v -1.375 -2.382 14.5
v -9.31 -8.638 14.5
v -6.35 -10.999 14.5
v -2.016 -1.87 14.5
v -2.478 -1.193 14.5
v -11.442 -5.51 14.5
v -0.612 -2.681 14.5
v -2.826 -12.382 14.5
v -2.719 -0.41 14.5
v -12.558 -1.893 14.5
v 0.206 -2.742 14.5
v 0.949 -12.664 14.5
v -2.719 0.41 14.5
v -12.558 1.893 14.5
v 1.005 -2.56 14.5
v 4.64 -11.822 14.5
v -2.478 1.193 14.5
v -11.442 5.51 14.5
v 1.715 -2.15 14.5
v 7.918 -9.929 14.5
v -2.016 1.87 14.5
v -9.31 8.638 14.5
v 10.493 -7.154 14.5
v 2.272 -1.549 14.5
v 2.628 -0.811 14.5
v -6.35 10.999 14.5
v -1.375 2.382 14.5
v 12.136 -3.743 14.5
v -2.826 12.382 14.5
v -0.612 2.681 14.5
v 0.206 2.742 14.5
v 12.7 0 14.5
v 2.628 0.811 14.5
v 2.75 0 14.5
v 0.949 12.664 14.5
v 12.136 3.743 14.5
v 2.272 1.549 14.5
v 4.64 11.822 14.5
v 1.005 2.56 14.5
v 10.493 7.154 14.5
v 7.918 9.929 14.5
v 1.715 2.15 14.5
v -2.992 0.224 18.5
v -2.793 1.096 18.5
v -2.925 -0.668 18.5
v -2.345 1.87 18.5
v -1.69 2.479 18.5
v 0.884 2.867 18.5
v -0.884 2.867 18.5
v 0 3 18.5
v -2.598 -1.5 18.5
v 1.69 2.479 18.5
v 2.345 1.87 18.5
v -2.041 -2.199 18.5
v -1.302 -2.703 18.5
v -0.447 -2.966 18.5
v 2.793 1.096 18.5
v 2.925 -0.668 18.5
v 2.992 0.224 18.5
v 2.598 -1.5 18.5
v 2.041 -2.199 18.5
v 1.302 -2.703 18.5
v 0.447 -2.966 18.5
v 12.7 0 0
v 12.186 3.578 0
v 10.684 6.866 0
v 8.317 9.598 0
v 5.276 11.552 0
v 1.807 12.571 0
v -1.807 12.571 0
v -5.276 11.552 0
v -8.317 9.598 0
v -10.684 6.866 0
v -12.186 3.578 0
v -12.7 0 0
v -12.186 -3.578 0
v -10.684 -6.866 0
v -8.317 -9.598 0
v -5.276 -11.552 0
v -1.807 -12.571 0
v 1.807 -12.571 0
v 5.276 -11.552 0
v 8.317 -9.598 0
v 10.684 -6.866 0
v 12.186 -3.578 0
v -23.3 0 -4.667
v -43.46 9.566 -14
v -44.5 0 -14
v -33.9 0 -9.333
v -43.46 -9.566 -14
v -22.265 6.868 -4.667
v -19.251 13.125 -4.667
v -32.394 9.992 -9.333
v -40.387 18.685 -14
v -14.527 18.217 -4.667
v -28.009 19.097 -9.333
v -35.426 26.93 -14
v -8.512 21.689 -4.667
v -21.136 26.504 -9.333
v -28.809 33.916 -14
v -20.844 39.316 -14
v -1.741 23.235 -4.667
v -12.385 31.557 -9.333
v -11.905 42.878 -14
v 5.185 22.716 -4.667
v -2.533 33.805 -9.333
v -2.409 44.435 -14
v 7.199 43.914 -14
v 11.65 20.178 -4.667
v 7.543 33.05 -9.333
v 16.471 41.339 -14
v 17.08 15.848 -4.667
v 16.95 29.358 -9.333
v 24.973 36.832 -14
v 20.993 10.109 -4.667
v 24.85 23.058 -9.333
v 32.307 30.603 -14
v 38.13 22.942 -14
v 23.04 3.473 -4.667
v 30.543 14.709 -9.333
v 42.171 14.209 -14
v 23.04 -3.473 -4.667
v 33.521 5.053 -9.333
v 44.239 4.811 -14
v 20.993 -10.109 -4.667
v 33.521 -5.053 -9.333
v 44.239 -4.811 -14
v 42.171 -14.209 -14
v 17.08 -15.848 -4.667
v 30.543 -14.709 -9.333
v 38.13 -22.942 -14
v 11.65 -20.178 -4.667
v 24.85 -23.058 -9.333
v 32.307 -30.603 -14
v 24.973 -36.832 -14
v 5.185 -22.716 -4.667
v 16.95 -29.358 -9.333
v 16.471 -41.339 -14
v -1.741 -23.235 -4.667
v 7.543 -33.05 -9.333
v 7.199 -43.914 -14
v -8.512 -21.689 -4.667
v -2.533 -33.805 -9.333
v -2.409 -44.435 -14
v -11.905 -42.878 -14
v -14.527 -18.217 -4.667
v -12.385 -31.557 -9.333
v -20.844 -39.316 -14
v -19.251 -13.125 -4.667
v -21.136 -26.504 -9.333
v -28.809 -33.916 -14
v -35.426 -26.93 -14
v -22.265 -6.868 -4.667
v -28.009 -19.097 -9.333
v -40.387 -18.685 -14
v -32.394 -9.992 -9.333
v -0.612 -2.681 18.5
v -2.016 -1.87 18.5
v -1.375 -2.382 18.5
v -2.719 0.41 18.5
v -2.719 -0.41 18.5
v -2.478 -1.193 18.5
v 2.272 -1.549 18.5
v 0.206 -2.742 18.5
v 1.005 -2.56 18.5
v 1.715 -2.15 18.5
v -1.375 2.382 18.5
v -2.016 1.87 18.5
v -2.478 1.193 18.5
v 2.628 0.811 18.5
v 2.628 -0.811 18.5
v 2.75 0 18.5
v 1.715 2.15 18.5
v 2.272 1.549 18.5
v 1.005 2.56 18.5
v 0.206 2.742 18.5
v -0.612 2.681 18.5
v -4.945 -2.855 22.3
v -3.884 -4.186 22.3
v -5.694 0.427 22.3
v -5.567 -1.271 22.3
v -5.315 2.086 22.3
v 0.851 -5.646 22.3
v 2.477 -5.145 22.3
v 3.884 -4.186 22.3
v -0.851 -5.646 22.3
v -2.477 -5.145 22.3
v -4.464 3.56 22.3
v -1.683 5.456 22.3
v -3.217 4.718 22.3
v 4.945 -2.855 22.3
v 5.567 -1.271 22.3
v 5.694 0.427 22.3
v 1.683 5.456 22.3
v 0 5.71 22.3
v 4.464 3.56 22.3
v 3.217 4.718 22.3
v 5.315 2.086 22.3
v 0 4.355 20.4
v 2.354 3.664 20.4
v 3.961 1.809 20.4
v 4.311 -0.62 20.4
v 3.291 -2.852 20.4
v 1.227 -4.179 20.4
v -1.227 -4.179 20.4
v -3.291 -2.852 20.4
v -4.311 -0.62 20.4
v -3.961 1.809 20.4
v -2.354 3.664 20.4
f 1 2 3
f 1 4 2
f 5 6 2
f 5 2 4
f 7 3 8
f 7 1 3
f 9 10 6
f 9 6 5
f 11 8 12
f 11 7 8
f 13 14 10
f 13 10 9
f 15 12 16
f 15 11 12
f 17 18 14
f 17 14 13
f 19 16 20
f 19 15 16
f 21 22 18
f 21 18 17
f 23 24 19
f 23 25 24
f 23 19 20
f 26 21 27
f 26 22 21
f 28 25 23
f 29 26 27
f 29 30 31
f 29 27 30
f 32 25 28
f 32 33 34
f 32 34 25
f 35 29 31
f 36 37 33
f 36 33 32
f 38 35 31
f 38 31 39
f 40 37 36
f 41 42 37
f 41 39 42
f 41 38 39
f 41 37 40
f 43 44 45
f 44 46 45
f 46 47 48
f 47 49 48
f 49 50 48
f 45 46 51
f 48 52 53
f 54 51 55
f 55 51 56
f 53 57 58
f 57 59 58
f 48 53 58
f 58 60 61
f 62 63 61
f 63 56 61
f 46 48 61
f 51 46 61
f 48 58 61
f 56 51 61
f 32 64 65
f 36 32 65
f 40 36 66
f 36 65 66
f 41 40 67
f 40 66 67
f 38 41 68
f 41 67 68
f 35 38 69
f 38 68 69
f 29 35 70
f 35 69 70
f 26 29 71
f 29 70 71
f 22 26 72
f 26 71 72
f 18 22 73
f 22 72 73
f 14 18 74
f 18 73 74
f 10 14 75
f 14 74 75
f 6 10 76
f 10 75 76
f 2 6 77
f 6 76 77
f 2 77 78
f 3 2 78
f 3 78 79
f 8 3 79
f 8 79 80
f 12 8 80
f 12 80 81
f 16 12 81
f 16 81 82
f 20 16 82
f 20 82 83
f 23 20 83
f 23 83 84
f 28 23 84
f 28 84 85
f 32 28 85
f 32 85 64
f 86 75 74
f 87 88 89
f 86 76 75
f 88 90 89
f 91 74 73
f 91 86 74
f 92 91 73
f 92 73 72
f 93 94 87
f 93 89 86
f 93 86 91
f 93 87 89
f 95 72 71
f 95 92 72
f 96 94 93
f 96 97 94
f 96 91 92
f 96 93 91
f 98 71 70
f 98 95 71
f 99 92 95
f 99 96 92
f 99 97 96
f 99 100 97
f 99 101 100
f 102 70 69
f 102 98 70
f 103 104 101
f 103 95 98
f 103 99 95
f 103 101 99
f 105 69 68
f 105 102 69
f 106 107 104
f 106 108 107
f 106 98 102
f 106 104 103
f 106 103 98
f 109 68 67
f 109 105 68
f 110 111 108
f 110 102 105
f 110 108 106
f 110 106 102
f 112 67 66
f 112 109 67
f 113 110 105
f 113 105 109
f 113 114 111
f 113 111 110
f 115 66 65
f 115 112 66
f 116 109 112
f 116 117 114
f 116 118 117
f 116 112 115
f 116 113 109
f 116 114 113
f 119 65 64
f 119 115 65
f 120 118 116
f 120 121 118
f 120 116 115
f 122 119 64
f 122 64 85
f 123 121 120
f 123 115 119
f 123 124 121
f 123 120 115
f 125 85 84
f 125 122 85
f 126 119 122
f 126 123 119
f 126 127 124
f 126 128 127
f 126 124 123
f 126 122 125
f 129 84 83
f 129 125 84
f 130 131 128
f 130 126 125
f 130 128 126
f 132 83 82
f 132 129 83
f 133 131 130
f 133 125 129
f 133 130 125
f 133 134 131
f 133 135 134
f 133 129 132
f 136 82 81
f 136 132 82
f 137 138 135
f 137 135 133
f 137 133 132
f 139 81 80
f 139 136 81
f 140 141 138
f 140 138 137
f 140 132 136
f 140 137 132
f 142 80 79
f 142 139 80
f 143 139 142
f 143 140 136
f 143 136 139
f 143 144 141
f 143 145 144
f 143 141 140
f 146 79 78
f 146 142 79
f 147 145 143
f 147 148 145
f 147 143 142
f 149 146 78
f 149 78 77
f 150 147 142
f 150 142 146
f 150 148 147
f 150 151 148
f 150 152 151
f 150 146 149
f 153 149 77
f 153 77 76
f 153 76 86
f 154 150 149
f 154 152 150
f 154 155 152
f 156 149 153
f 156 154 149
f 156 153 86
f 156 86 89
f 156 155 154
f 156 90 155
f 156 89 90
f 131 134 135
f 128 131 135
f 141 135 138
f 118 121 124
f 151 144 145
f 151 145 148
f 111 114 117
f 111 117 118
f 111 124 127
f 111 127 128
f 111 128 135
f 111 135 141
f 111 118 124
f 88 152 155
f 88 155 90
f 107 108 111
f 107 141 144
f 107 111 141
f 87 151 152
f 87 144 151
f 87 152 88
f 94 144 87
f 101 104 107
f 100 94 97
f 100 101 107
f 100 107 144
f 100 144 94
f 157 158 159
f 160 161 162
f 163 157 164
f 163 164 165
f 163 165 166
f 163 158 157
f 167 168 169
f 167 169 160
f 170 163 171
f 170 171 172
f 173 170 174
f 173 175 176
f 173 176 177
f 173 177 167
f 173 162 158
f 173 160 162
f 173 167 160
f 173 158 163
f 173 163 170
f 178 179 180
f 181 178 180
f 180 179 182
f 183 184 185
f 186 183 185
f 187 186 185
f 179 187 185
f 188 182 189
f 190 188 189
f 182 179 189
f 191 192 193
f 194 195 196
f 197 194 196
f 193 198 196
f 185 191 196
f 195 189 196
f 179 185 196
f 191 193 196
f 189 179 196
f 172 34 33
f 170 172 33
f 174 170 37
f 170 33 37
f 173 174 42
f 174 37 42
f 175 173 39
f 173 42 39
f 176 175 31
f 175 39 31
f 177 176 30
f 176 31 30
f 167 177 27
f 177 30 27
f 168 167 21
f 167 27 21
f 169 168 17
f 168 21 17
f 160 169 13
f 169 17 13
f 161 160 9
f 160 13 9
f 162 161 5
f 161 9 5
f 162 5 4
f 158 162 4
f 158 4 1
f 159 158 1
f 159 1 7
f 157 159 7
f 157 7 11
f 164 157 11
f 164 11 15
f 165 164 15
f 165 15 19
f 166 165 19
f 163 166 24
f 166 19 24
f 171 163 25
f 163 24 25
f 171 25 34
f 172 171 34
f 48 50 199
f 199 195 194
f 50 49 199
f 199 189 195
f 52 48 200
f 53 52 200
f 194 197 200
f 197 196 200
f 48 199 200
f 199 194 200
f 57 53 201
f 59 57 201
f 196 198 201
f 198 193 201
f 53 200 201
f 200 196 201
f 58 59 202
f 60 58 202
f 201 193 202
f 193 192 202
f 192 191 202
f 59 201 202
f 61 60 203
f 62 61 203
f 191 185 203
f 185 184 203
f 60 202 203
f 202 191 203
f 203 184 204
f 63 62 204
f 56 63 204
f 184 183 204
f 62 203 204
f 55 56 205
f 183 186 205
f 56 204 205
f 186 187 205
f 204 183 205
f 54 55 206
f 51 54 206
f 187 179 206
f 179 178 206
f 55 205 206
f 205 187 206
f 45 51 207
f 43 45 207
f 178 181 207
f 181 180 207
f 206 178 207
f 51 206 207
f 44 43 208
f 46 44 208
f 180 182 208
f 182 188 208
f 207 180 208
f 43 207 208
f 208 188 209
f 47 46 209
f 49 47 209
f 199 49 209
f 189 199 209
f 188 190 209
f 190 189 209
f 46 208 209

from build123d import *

# Parameters (mm, degrees)
F0_R     = 12.7
F1_DEPTH = 14.5
F4_R     = 2.75
F5_DEPTH = 4


with BuildPart() as f1:
    # F0 (on Top) → F1 (new body)
    with BuildSketch(Plane.XY):
        Circle(F0_R)
    extrude(amount=F1_DEPTH)

    # F2 (on Front) → F3 (revolve)
    with BuildSketch(Plane.XZ):
        Polygon((0, 0), (-12.7, 0), (-44.5, -14), (0, -14), align=None)
    revolve(axis=Axis((0, 0, -7), (0, 0, -1)))

    # F4 (on face) → F5 (join)
    with BuildSketch(Plane.XY.offset(14.5)):
        Circle(F4_R)
    extrude(amount=F5_DEPTH)


with BuildPart() as f7:
    # F6 (on Right) → F7 (revolve)
    with BuildSketch(Plane.YZ):
        Polygon((0, 22.3), (0, 18.5), (3, 18.5), (5.71, 22.3), align=None)
    revolve(axis=Axis((0, 0, 20.4), (0, 0, -1)))


solid = Compound([f1.part, f7.part])
